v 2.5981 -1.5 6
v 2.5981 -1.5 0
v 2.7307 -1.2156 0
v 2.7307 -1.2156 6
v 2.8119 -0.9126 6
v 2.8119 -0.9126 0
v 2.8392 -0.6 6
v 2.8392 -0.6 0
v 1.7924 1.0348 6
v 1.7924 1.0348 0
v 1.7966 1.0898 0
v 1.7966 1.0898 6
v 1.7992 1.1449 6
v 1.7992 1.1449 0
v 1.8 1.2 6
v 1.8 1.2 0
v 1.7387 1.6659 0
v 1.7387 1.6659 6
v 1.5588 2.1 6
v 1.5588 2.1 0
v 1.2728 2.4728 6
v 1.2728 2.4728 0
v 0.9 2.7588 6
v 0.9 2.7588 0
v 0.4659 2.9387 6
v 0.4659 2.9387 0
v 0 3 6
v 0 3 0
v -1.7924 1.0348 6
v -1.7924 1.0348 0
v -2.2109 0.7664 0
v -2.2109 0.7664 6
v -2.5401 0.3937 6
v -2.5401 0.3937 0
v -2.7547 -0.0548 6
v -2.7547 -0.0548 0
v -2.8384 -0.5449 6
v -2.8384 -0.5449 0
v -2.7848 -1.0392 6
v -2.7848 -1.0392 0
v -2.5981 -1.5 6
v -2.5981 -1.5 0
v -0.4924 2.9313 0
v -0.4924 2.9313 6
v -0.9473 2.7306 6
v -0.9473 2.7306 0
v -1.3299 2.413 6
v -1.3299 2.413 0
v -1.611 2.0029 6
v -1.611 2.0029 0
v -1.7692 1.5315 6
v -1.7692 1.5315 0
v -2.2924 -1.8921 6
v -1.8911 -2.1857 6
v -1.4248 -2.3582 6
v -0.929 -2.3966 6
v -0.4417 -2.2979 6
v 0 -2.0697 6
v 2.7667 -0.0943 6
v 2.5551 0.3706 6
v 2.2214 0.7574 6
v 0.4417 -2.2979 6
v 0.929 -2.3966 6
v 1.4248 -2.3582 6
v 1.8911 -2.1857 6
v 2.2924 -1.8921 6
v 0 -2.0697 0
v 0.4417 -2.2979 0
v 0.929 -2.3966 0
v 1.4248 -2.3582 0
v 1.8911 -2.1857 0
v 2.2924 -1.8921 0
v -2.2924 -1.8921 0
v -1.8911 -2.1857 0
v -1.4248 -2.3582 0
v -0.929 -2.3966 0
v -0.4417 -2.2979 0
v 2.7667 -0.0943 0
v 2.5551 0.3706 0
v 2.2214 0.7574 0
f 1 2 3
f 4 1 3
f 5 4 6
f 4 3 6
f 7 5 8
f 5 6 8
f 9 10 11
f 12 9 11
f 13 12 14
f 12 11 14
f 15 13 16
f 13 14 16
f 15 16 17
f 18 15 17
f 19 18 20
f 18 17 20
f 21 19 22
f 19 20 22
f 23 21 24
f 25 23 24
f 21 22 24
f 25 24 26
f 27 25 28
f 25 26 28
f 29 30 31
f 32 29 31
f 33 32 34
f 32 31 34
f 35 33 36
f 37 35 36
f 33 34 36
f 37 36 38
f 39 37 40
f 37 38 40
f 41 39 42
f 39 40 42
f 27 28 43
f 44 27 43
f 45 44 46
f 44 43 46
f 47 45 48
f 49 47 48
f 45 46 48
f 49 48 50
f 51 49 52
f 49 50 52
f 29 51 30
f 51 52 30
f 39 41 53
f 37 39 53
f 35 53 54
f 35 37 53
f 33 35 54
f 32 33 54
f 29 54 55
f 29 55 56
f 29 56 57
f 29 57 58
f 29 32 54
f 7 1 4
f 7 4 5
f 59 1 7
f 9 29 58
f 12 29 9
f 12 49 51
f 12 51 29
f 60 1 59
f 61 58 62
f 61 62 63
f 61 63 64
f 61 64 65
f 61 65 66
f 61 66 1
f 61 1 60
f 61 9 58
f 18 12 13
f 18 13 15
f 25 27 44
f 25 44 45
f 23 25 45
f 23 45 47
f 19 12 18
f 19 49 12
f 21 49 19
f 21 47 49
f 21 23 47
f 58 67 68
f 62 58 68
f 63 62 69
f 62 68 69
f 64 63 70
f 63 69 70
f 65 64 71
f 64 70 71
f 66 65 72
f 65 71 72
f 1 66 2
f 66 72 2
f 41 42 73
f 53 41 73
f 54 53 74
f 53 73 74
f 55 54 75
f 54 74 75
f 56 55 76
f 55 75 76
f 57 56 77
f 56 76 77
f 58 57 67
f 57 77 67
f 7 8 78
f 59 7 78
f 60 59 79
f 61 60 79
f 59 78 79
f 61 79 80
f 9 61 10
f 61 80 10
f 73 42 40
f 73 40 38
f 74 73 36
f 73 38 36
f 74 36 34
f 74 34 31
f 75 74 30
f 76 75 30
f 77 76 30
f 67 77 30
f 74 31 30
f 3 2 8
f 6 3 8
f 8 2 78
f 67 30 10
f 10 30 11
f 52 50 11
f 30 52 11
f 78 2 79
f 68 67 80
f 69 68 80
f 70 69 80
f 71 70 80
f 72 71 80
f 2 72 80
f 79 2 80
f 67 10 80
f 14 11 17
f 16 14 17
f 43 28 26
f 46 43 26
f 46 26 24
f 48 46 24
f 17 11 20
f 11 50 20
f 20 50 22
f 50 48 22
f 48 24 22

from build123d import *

# Parameters (mm, degrees)
F1_DEPTH = 6


with BuildPart() as f1:
    # F0 (on Top) → F1 (new body)
    with BuildSketch(Plane.XY):
        with BuildLine():
            ThreePointArc((1.8, 1.2), (1.2727922061, 2.4727922061), (0, 3))
            ThreePointArc((0, 3), (-1.3299014134, 2.4129972096), (-1.7924074484, 1.0348469228))
            ThreePointArc((-1.7924074484, 1.0348469228), (-0.9565667293, 1.1981008602), (-0.1392304845, 0.9588457268))
            Line((-0.1392304845, 0.9588457268), (0, 1.2))
            Line((0, 1.2), (0.1392304845, 0.9588457268))
            ThreePointArc((0.1392304845, 0.9588457268), (0.9565667293, 1.1981008602), (1.7924074484, 1.0348469228))
            ThreePointArc((1.7924074484, 1.0348469228), (1.7981008602, 1.1173362447), (1.8, 1.2))
        make_face()
        with BuildLine():
            Line((0, 1.2), (-0.1392304845, 0.9588457268))
            ThreePointArc((-0.1392304845, 0.9588457268), (-0.0685911424, 0.9158691459), (0, 0.8696938457))
            ThreePointArc((0, 0.8696938457), (0.0685911424, 0.9158691459), (0.1392304845, 0.9588457268))
            Line((0.1392304845, 0.9588457268), (0, 1.2))
        make_face()
        with BuildLine():
            Line((0.5196152464, 0.2999999928), (0.1392304845, 0.9588457268))
            ThreePointArc((0.1392304845, 0.9588457268), (0.0685911424, 0.9158691459), (0, 0.8696938457))
            ThreePointArc((0, 0.8696938457), (0.2906709317, 0.6129972066), (0.5196152464, 0.2999999928))
        make_face()
        with BuildLine():
            ThreePointArc((-0.5196152407, 0.3000000027), (-0.6762066199, -0.0547701947), (-0.7531769639, -0.4348469228))
            ThreePointArc((-0.7531769639, -0.4348469228), (-0.3855356915, -0.5582270134), (0, -0.6))
            ThreePointArc((0, -0.6), (0.3855356915, -0.5582270134), (0.7531769639, -0.4348469228))
            ThreePointArc((0.7531769639, -0.4348469228), (0.6762066217, -0.0547702002), (0.5196152464, 0.2999999928))
            ThreePointArc((0.5196152464, 0.2999999928), (0.2906709317, 0.6129972066), (0, 0.8696938457))
            ThreePointArc((0, 0.8696938457), (-0.2906709278, 0.6129972108), (-0.5196152407, 0.3000000027))
        make_face()
        with BuildLine():
            ThreePointArc((0, 0.8696938457), (-0.0685911424, 0.9158691459), (-0.1392304845, 0.9588457268))
            Line((-0.1392304845, 0.9588457268), (-0.5196152407, 0.3000000027))
            ThreePointArc((-0.5196152407, 0.3000000027), (-0.2906709278, 0.6129972108), (0, 0.8696938457))
        make_face()
        with BuildLine():
            ThreePointArc((-0.1392304845, 0.9588457268), (-0.9565667293, 1.1981008602), (-1.7924074484, 1.0348469228))
            ThreePointArc((-1.7924074484, 1.0348469228), (-1.5158691459, 0.2293606579), (-0.9, -0.3588457268))
            Line((-0.9, -0.3588457268), (-0.5196152407, 0.3000000027))
            Line((-0.5196152407, 0.3000000027), (-0.1392304845, 0.9588457268))
        make_face()
        with BuildLine():
            ThreePointArc((0.9, -0.3588457268), (1.5158691459, 0.2293606579), (1.7924074484, 1.0348469228))
            ThreePointArc((1.7924074484, 1.0348469228), (0.9565667293, 1.1981008602), (0.1392304845, 0.9588457268))
            Line((0.1392304845, 0.9588457268), (0.5196152464, 0.2999999928))
            Line((0.5196152464, 0.2999999928), (0.9, -0.3588457268))
        make_face()
        with BuildLine():
            ThreePointArc((0, -2.0696938457), (1.4247662137, -2.3582270051), (2.5980762498, -1.4999999333))
            ThreePointArc((2.5980762498, -1.4999999333), (2.7778969818, -1.065874244), (2.8392304845, -0.6))
            ThreePointArc((2.8392304845, -0.6), (2.5550996304, 0.3706393421), (1.7924074484, 1.0348469228))
            ThreePointArc((1.7924074484, 1.0348469228), (1.5158691459, 0.2293606579), (0.9, -0.3588457268))
            Line((0.9, -0.3588457268), (1.0392304845, -0.6))
            Line((1.0392304845, -0.6), (0.7607695155, -0.6))
            ThreePointArc((0.7607695155, -0.6), (0.5593024166, -1.4274615181), (0, -2.0696938457))
        make_face()
        with BuildLine():
            ThreePointArc((0.7531769639, -0.4348469228), (0.8274615181, -0.3985329012), (0.9, -0.3588457268))
            Line((0.9, -0.3588457268), (0.5196152464, 0.2999999928))
            ThreePointArc((0.5196152464, 0.2999999928), (0.6762066217, -0.0547702002), (0.7531769639, -0.4348469228))
        make_face()
        with BuildLine():
            ThreePointArc((0.7531769639, -0.4348469228), (0.7588703757, -0.5173362447), (0.7607695155, -0.6))
            Line((0.7607695155, -0.6), (1.0392304845, -0.6))
            Line((1.0392304845, -0.6), (0.9, -0.3588457268))
            ThreePointArc((0.9, -0.3588457268), (0.8274615181, -0.3985329012), (0.7531769639, -0.4348469228))
        make_face()
        with BuildLine():
            Line((0, -0.6), (0.7607695155, -0.6))
            ThreePointArc((0.7607695155, -0.6), (0.7588703757, -0.5173362447), (0.7531769639, -0.4348469228))
            ThreePointArc((0.7531769639, -0.4348469228), (0.3855356915, -0.5582270134), (0, -0.6))
        make_face()
        with BuildLine():
            ThreePointArc((-0.7531769639, -0.4348469228), (-0.7588703757, -0.5173362447), (-0.7607695155, -0.6))
            Line((-0.7607695155, -0.6), (0, -0.6))
            ThreePointArc((0, -0.6), (-0.3855356915, -0.5582270134), (-0.7531769639, -0.4348469228))
        make_face()
        with BuildLine():
            ThreePointArc((-0.7531769639, -0.4348469228), (-0.8274615181, -0.3985329012), (-0.9, -0.3588457268))
            Line((-0.9, -0.3588457268), (-1.0392304845, -0.6))
            Line((-1.0392304845, -0.6), (-0.7607695155, -0.6))
            ThreePointArc((-0.7607695155, -0.6), (-0.7588703757, -0.5173362447), (-0.7531769639, -0.4348469228))
        make_face()
        with BuildLine():
            Line((-0.5196152407, 0.3000000027), (-0.9, -0.3588457268))
            ThreePointArc((-0.9, -0.3588457268), (-0.8274615181, -0.3985329012), (-0.7531769639, -0.4348469228))
            ThreePointArc((-0.7531769639, -0.4348469228), (-0.6762066199, -0.0547701947), (-0.5196152407, 0.3000000027))
        make_face()
        with BuildLine():
            ThreePointArc((-0.7607695155, -0.6), (-0.5593024166, -1.4274615181), (0, -2.0696938457))
            ThreePointArc((0, -2.0696938457), (0.5593024166, -1.4274615181), (0.7607695155, -0.6))
            Line((0.7607695155, -0.6), (0, -0.6))
            Line((0, -0.6), (-0.7607695155, -0.6))
        make_face()
        with BuildLine():
            ThreePointArc((-1.7924074484, 1.0348469228), (-2.7546675887, -0.0547701937), (-2.5980762141, -1.4999999953))
            ThreePointArc((-2.5980762141, -1.4999999953), (-1.4247661787, -2.3582270128), (0, -2.0696938457))
            ThreePointArc((0, -2.0696938457), (-0.5593024166, -1.4274615181), (-0.7607695155, -0.6))
            Line((-0.7607695155, -0.6), (-1.0392304845, -0.6))
            Line((-1.0392304845, -0.6), (-0.9, -0.3588457268))
            ThreePointArc((-0.9, -0.3588457268), (-1.5158691459, 0.2293606579), (-1.7924074484, 1.0348469228))
        make_face()
    extrude(amount=F1_DEPTH)


solid = f1.part
